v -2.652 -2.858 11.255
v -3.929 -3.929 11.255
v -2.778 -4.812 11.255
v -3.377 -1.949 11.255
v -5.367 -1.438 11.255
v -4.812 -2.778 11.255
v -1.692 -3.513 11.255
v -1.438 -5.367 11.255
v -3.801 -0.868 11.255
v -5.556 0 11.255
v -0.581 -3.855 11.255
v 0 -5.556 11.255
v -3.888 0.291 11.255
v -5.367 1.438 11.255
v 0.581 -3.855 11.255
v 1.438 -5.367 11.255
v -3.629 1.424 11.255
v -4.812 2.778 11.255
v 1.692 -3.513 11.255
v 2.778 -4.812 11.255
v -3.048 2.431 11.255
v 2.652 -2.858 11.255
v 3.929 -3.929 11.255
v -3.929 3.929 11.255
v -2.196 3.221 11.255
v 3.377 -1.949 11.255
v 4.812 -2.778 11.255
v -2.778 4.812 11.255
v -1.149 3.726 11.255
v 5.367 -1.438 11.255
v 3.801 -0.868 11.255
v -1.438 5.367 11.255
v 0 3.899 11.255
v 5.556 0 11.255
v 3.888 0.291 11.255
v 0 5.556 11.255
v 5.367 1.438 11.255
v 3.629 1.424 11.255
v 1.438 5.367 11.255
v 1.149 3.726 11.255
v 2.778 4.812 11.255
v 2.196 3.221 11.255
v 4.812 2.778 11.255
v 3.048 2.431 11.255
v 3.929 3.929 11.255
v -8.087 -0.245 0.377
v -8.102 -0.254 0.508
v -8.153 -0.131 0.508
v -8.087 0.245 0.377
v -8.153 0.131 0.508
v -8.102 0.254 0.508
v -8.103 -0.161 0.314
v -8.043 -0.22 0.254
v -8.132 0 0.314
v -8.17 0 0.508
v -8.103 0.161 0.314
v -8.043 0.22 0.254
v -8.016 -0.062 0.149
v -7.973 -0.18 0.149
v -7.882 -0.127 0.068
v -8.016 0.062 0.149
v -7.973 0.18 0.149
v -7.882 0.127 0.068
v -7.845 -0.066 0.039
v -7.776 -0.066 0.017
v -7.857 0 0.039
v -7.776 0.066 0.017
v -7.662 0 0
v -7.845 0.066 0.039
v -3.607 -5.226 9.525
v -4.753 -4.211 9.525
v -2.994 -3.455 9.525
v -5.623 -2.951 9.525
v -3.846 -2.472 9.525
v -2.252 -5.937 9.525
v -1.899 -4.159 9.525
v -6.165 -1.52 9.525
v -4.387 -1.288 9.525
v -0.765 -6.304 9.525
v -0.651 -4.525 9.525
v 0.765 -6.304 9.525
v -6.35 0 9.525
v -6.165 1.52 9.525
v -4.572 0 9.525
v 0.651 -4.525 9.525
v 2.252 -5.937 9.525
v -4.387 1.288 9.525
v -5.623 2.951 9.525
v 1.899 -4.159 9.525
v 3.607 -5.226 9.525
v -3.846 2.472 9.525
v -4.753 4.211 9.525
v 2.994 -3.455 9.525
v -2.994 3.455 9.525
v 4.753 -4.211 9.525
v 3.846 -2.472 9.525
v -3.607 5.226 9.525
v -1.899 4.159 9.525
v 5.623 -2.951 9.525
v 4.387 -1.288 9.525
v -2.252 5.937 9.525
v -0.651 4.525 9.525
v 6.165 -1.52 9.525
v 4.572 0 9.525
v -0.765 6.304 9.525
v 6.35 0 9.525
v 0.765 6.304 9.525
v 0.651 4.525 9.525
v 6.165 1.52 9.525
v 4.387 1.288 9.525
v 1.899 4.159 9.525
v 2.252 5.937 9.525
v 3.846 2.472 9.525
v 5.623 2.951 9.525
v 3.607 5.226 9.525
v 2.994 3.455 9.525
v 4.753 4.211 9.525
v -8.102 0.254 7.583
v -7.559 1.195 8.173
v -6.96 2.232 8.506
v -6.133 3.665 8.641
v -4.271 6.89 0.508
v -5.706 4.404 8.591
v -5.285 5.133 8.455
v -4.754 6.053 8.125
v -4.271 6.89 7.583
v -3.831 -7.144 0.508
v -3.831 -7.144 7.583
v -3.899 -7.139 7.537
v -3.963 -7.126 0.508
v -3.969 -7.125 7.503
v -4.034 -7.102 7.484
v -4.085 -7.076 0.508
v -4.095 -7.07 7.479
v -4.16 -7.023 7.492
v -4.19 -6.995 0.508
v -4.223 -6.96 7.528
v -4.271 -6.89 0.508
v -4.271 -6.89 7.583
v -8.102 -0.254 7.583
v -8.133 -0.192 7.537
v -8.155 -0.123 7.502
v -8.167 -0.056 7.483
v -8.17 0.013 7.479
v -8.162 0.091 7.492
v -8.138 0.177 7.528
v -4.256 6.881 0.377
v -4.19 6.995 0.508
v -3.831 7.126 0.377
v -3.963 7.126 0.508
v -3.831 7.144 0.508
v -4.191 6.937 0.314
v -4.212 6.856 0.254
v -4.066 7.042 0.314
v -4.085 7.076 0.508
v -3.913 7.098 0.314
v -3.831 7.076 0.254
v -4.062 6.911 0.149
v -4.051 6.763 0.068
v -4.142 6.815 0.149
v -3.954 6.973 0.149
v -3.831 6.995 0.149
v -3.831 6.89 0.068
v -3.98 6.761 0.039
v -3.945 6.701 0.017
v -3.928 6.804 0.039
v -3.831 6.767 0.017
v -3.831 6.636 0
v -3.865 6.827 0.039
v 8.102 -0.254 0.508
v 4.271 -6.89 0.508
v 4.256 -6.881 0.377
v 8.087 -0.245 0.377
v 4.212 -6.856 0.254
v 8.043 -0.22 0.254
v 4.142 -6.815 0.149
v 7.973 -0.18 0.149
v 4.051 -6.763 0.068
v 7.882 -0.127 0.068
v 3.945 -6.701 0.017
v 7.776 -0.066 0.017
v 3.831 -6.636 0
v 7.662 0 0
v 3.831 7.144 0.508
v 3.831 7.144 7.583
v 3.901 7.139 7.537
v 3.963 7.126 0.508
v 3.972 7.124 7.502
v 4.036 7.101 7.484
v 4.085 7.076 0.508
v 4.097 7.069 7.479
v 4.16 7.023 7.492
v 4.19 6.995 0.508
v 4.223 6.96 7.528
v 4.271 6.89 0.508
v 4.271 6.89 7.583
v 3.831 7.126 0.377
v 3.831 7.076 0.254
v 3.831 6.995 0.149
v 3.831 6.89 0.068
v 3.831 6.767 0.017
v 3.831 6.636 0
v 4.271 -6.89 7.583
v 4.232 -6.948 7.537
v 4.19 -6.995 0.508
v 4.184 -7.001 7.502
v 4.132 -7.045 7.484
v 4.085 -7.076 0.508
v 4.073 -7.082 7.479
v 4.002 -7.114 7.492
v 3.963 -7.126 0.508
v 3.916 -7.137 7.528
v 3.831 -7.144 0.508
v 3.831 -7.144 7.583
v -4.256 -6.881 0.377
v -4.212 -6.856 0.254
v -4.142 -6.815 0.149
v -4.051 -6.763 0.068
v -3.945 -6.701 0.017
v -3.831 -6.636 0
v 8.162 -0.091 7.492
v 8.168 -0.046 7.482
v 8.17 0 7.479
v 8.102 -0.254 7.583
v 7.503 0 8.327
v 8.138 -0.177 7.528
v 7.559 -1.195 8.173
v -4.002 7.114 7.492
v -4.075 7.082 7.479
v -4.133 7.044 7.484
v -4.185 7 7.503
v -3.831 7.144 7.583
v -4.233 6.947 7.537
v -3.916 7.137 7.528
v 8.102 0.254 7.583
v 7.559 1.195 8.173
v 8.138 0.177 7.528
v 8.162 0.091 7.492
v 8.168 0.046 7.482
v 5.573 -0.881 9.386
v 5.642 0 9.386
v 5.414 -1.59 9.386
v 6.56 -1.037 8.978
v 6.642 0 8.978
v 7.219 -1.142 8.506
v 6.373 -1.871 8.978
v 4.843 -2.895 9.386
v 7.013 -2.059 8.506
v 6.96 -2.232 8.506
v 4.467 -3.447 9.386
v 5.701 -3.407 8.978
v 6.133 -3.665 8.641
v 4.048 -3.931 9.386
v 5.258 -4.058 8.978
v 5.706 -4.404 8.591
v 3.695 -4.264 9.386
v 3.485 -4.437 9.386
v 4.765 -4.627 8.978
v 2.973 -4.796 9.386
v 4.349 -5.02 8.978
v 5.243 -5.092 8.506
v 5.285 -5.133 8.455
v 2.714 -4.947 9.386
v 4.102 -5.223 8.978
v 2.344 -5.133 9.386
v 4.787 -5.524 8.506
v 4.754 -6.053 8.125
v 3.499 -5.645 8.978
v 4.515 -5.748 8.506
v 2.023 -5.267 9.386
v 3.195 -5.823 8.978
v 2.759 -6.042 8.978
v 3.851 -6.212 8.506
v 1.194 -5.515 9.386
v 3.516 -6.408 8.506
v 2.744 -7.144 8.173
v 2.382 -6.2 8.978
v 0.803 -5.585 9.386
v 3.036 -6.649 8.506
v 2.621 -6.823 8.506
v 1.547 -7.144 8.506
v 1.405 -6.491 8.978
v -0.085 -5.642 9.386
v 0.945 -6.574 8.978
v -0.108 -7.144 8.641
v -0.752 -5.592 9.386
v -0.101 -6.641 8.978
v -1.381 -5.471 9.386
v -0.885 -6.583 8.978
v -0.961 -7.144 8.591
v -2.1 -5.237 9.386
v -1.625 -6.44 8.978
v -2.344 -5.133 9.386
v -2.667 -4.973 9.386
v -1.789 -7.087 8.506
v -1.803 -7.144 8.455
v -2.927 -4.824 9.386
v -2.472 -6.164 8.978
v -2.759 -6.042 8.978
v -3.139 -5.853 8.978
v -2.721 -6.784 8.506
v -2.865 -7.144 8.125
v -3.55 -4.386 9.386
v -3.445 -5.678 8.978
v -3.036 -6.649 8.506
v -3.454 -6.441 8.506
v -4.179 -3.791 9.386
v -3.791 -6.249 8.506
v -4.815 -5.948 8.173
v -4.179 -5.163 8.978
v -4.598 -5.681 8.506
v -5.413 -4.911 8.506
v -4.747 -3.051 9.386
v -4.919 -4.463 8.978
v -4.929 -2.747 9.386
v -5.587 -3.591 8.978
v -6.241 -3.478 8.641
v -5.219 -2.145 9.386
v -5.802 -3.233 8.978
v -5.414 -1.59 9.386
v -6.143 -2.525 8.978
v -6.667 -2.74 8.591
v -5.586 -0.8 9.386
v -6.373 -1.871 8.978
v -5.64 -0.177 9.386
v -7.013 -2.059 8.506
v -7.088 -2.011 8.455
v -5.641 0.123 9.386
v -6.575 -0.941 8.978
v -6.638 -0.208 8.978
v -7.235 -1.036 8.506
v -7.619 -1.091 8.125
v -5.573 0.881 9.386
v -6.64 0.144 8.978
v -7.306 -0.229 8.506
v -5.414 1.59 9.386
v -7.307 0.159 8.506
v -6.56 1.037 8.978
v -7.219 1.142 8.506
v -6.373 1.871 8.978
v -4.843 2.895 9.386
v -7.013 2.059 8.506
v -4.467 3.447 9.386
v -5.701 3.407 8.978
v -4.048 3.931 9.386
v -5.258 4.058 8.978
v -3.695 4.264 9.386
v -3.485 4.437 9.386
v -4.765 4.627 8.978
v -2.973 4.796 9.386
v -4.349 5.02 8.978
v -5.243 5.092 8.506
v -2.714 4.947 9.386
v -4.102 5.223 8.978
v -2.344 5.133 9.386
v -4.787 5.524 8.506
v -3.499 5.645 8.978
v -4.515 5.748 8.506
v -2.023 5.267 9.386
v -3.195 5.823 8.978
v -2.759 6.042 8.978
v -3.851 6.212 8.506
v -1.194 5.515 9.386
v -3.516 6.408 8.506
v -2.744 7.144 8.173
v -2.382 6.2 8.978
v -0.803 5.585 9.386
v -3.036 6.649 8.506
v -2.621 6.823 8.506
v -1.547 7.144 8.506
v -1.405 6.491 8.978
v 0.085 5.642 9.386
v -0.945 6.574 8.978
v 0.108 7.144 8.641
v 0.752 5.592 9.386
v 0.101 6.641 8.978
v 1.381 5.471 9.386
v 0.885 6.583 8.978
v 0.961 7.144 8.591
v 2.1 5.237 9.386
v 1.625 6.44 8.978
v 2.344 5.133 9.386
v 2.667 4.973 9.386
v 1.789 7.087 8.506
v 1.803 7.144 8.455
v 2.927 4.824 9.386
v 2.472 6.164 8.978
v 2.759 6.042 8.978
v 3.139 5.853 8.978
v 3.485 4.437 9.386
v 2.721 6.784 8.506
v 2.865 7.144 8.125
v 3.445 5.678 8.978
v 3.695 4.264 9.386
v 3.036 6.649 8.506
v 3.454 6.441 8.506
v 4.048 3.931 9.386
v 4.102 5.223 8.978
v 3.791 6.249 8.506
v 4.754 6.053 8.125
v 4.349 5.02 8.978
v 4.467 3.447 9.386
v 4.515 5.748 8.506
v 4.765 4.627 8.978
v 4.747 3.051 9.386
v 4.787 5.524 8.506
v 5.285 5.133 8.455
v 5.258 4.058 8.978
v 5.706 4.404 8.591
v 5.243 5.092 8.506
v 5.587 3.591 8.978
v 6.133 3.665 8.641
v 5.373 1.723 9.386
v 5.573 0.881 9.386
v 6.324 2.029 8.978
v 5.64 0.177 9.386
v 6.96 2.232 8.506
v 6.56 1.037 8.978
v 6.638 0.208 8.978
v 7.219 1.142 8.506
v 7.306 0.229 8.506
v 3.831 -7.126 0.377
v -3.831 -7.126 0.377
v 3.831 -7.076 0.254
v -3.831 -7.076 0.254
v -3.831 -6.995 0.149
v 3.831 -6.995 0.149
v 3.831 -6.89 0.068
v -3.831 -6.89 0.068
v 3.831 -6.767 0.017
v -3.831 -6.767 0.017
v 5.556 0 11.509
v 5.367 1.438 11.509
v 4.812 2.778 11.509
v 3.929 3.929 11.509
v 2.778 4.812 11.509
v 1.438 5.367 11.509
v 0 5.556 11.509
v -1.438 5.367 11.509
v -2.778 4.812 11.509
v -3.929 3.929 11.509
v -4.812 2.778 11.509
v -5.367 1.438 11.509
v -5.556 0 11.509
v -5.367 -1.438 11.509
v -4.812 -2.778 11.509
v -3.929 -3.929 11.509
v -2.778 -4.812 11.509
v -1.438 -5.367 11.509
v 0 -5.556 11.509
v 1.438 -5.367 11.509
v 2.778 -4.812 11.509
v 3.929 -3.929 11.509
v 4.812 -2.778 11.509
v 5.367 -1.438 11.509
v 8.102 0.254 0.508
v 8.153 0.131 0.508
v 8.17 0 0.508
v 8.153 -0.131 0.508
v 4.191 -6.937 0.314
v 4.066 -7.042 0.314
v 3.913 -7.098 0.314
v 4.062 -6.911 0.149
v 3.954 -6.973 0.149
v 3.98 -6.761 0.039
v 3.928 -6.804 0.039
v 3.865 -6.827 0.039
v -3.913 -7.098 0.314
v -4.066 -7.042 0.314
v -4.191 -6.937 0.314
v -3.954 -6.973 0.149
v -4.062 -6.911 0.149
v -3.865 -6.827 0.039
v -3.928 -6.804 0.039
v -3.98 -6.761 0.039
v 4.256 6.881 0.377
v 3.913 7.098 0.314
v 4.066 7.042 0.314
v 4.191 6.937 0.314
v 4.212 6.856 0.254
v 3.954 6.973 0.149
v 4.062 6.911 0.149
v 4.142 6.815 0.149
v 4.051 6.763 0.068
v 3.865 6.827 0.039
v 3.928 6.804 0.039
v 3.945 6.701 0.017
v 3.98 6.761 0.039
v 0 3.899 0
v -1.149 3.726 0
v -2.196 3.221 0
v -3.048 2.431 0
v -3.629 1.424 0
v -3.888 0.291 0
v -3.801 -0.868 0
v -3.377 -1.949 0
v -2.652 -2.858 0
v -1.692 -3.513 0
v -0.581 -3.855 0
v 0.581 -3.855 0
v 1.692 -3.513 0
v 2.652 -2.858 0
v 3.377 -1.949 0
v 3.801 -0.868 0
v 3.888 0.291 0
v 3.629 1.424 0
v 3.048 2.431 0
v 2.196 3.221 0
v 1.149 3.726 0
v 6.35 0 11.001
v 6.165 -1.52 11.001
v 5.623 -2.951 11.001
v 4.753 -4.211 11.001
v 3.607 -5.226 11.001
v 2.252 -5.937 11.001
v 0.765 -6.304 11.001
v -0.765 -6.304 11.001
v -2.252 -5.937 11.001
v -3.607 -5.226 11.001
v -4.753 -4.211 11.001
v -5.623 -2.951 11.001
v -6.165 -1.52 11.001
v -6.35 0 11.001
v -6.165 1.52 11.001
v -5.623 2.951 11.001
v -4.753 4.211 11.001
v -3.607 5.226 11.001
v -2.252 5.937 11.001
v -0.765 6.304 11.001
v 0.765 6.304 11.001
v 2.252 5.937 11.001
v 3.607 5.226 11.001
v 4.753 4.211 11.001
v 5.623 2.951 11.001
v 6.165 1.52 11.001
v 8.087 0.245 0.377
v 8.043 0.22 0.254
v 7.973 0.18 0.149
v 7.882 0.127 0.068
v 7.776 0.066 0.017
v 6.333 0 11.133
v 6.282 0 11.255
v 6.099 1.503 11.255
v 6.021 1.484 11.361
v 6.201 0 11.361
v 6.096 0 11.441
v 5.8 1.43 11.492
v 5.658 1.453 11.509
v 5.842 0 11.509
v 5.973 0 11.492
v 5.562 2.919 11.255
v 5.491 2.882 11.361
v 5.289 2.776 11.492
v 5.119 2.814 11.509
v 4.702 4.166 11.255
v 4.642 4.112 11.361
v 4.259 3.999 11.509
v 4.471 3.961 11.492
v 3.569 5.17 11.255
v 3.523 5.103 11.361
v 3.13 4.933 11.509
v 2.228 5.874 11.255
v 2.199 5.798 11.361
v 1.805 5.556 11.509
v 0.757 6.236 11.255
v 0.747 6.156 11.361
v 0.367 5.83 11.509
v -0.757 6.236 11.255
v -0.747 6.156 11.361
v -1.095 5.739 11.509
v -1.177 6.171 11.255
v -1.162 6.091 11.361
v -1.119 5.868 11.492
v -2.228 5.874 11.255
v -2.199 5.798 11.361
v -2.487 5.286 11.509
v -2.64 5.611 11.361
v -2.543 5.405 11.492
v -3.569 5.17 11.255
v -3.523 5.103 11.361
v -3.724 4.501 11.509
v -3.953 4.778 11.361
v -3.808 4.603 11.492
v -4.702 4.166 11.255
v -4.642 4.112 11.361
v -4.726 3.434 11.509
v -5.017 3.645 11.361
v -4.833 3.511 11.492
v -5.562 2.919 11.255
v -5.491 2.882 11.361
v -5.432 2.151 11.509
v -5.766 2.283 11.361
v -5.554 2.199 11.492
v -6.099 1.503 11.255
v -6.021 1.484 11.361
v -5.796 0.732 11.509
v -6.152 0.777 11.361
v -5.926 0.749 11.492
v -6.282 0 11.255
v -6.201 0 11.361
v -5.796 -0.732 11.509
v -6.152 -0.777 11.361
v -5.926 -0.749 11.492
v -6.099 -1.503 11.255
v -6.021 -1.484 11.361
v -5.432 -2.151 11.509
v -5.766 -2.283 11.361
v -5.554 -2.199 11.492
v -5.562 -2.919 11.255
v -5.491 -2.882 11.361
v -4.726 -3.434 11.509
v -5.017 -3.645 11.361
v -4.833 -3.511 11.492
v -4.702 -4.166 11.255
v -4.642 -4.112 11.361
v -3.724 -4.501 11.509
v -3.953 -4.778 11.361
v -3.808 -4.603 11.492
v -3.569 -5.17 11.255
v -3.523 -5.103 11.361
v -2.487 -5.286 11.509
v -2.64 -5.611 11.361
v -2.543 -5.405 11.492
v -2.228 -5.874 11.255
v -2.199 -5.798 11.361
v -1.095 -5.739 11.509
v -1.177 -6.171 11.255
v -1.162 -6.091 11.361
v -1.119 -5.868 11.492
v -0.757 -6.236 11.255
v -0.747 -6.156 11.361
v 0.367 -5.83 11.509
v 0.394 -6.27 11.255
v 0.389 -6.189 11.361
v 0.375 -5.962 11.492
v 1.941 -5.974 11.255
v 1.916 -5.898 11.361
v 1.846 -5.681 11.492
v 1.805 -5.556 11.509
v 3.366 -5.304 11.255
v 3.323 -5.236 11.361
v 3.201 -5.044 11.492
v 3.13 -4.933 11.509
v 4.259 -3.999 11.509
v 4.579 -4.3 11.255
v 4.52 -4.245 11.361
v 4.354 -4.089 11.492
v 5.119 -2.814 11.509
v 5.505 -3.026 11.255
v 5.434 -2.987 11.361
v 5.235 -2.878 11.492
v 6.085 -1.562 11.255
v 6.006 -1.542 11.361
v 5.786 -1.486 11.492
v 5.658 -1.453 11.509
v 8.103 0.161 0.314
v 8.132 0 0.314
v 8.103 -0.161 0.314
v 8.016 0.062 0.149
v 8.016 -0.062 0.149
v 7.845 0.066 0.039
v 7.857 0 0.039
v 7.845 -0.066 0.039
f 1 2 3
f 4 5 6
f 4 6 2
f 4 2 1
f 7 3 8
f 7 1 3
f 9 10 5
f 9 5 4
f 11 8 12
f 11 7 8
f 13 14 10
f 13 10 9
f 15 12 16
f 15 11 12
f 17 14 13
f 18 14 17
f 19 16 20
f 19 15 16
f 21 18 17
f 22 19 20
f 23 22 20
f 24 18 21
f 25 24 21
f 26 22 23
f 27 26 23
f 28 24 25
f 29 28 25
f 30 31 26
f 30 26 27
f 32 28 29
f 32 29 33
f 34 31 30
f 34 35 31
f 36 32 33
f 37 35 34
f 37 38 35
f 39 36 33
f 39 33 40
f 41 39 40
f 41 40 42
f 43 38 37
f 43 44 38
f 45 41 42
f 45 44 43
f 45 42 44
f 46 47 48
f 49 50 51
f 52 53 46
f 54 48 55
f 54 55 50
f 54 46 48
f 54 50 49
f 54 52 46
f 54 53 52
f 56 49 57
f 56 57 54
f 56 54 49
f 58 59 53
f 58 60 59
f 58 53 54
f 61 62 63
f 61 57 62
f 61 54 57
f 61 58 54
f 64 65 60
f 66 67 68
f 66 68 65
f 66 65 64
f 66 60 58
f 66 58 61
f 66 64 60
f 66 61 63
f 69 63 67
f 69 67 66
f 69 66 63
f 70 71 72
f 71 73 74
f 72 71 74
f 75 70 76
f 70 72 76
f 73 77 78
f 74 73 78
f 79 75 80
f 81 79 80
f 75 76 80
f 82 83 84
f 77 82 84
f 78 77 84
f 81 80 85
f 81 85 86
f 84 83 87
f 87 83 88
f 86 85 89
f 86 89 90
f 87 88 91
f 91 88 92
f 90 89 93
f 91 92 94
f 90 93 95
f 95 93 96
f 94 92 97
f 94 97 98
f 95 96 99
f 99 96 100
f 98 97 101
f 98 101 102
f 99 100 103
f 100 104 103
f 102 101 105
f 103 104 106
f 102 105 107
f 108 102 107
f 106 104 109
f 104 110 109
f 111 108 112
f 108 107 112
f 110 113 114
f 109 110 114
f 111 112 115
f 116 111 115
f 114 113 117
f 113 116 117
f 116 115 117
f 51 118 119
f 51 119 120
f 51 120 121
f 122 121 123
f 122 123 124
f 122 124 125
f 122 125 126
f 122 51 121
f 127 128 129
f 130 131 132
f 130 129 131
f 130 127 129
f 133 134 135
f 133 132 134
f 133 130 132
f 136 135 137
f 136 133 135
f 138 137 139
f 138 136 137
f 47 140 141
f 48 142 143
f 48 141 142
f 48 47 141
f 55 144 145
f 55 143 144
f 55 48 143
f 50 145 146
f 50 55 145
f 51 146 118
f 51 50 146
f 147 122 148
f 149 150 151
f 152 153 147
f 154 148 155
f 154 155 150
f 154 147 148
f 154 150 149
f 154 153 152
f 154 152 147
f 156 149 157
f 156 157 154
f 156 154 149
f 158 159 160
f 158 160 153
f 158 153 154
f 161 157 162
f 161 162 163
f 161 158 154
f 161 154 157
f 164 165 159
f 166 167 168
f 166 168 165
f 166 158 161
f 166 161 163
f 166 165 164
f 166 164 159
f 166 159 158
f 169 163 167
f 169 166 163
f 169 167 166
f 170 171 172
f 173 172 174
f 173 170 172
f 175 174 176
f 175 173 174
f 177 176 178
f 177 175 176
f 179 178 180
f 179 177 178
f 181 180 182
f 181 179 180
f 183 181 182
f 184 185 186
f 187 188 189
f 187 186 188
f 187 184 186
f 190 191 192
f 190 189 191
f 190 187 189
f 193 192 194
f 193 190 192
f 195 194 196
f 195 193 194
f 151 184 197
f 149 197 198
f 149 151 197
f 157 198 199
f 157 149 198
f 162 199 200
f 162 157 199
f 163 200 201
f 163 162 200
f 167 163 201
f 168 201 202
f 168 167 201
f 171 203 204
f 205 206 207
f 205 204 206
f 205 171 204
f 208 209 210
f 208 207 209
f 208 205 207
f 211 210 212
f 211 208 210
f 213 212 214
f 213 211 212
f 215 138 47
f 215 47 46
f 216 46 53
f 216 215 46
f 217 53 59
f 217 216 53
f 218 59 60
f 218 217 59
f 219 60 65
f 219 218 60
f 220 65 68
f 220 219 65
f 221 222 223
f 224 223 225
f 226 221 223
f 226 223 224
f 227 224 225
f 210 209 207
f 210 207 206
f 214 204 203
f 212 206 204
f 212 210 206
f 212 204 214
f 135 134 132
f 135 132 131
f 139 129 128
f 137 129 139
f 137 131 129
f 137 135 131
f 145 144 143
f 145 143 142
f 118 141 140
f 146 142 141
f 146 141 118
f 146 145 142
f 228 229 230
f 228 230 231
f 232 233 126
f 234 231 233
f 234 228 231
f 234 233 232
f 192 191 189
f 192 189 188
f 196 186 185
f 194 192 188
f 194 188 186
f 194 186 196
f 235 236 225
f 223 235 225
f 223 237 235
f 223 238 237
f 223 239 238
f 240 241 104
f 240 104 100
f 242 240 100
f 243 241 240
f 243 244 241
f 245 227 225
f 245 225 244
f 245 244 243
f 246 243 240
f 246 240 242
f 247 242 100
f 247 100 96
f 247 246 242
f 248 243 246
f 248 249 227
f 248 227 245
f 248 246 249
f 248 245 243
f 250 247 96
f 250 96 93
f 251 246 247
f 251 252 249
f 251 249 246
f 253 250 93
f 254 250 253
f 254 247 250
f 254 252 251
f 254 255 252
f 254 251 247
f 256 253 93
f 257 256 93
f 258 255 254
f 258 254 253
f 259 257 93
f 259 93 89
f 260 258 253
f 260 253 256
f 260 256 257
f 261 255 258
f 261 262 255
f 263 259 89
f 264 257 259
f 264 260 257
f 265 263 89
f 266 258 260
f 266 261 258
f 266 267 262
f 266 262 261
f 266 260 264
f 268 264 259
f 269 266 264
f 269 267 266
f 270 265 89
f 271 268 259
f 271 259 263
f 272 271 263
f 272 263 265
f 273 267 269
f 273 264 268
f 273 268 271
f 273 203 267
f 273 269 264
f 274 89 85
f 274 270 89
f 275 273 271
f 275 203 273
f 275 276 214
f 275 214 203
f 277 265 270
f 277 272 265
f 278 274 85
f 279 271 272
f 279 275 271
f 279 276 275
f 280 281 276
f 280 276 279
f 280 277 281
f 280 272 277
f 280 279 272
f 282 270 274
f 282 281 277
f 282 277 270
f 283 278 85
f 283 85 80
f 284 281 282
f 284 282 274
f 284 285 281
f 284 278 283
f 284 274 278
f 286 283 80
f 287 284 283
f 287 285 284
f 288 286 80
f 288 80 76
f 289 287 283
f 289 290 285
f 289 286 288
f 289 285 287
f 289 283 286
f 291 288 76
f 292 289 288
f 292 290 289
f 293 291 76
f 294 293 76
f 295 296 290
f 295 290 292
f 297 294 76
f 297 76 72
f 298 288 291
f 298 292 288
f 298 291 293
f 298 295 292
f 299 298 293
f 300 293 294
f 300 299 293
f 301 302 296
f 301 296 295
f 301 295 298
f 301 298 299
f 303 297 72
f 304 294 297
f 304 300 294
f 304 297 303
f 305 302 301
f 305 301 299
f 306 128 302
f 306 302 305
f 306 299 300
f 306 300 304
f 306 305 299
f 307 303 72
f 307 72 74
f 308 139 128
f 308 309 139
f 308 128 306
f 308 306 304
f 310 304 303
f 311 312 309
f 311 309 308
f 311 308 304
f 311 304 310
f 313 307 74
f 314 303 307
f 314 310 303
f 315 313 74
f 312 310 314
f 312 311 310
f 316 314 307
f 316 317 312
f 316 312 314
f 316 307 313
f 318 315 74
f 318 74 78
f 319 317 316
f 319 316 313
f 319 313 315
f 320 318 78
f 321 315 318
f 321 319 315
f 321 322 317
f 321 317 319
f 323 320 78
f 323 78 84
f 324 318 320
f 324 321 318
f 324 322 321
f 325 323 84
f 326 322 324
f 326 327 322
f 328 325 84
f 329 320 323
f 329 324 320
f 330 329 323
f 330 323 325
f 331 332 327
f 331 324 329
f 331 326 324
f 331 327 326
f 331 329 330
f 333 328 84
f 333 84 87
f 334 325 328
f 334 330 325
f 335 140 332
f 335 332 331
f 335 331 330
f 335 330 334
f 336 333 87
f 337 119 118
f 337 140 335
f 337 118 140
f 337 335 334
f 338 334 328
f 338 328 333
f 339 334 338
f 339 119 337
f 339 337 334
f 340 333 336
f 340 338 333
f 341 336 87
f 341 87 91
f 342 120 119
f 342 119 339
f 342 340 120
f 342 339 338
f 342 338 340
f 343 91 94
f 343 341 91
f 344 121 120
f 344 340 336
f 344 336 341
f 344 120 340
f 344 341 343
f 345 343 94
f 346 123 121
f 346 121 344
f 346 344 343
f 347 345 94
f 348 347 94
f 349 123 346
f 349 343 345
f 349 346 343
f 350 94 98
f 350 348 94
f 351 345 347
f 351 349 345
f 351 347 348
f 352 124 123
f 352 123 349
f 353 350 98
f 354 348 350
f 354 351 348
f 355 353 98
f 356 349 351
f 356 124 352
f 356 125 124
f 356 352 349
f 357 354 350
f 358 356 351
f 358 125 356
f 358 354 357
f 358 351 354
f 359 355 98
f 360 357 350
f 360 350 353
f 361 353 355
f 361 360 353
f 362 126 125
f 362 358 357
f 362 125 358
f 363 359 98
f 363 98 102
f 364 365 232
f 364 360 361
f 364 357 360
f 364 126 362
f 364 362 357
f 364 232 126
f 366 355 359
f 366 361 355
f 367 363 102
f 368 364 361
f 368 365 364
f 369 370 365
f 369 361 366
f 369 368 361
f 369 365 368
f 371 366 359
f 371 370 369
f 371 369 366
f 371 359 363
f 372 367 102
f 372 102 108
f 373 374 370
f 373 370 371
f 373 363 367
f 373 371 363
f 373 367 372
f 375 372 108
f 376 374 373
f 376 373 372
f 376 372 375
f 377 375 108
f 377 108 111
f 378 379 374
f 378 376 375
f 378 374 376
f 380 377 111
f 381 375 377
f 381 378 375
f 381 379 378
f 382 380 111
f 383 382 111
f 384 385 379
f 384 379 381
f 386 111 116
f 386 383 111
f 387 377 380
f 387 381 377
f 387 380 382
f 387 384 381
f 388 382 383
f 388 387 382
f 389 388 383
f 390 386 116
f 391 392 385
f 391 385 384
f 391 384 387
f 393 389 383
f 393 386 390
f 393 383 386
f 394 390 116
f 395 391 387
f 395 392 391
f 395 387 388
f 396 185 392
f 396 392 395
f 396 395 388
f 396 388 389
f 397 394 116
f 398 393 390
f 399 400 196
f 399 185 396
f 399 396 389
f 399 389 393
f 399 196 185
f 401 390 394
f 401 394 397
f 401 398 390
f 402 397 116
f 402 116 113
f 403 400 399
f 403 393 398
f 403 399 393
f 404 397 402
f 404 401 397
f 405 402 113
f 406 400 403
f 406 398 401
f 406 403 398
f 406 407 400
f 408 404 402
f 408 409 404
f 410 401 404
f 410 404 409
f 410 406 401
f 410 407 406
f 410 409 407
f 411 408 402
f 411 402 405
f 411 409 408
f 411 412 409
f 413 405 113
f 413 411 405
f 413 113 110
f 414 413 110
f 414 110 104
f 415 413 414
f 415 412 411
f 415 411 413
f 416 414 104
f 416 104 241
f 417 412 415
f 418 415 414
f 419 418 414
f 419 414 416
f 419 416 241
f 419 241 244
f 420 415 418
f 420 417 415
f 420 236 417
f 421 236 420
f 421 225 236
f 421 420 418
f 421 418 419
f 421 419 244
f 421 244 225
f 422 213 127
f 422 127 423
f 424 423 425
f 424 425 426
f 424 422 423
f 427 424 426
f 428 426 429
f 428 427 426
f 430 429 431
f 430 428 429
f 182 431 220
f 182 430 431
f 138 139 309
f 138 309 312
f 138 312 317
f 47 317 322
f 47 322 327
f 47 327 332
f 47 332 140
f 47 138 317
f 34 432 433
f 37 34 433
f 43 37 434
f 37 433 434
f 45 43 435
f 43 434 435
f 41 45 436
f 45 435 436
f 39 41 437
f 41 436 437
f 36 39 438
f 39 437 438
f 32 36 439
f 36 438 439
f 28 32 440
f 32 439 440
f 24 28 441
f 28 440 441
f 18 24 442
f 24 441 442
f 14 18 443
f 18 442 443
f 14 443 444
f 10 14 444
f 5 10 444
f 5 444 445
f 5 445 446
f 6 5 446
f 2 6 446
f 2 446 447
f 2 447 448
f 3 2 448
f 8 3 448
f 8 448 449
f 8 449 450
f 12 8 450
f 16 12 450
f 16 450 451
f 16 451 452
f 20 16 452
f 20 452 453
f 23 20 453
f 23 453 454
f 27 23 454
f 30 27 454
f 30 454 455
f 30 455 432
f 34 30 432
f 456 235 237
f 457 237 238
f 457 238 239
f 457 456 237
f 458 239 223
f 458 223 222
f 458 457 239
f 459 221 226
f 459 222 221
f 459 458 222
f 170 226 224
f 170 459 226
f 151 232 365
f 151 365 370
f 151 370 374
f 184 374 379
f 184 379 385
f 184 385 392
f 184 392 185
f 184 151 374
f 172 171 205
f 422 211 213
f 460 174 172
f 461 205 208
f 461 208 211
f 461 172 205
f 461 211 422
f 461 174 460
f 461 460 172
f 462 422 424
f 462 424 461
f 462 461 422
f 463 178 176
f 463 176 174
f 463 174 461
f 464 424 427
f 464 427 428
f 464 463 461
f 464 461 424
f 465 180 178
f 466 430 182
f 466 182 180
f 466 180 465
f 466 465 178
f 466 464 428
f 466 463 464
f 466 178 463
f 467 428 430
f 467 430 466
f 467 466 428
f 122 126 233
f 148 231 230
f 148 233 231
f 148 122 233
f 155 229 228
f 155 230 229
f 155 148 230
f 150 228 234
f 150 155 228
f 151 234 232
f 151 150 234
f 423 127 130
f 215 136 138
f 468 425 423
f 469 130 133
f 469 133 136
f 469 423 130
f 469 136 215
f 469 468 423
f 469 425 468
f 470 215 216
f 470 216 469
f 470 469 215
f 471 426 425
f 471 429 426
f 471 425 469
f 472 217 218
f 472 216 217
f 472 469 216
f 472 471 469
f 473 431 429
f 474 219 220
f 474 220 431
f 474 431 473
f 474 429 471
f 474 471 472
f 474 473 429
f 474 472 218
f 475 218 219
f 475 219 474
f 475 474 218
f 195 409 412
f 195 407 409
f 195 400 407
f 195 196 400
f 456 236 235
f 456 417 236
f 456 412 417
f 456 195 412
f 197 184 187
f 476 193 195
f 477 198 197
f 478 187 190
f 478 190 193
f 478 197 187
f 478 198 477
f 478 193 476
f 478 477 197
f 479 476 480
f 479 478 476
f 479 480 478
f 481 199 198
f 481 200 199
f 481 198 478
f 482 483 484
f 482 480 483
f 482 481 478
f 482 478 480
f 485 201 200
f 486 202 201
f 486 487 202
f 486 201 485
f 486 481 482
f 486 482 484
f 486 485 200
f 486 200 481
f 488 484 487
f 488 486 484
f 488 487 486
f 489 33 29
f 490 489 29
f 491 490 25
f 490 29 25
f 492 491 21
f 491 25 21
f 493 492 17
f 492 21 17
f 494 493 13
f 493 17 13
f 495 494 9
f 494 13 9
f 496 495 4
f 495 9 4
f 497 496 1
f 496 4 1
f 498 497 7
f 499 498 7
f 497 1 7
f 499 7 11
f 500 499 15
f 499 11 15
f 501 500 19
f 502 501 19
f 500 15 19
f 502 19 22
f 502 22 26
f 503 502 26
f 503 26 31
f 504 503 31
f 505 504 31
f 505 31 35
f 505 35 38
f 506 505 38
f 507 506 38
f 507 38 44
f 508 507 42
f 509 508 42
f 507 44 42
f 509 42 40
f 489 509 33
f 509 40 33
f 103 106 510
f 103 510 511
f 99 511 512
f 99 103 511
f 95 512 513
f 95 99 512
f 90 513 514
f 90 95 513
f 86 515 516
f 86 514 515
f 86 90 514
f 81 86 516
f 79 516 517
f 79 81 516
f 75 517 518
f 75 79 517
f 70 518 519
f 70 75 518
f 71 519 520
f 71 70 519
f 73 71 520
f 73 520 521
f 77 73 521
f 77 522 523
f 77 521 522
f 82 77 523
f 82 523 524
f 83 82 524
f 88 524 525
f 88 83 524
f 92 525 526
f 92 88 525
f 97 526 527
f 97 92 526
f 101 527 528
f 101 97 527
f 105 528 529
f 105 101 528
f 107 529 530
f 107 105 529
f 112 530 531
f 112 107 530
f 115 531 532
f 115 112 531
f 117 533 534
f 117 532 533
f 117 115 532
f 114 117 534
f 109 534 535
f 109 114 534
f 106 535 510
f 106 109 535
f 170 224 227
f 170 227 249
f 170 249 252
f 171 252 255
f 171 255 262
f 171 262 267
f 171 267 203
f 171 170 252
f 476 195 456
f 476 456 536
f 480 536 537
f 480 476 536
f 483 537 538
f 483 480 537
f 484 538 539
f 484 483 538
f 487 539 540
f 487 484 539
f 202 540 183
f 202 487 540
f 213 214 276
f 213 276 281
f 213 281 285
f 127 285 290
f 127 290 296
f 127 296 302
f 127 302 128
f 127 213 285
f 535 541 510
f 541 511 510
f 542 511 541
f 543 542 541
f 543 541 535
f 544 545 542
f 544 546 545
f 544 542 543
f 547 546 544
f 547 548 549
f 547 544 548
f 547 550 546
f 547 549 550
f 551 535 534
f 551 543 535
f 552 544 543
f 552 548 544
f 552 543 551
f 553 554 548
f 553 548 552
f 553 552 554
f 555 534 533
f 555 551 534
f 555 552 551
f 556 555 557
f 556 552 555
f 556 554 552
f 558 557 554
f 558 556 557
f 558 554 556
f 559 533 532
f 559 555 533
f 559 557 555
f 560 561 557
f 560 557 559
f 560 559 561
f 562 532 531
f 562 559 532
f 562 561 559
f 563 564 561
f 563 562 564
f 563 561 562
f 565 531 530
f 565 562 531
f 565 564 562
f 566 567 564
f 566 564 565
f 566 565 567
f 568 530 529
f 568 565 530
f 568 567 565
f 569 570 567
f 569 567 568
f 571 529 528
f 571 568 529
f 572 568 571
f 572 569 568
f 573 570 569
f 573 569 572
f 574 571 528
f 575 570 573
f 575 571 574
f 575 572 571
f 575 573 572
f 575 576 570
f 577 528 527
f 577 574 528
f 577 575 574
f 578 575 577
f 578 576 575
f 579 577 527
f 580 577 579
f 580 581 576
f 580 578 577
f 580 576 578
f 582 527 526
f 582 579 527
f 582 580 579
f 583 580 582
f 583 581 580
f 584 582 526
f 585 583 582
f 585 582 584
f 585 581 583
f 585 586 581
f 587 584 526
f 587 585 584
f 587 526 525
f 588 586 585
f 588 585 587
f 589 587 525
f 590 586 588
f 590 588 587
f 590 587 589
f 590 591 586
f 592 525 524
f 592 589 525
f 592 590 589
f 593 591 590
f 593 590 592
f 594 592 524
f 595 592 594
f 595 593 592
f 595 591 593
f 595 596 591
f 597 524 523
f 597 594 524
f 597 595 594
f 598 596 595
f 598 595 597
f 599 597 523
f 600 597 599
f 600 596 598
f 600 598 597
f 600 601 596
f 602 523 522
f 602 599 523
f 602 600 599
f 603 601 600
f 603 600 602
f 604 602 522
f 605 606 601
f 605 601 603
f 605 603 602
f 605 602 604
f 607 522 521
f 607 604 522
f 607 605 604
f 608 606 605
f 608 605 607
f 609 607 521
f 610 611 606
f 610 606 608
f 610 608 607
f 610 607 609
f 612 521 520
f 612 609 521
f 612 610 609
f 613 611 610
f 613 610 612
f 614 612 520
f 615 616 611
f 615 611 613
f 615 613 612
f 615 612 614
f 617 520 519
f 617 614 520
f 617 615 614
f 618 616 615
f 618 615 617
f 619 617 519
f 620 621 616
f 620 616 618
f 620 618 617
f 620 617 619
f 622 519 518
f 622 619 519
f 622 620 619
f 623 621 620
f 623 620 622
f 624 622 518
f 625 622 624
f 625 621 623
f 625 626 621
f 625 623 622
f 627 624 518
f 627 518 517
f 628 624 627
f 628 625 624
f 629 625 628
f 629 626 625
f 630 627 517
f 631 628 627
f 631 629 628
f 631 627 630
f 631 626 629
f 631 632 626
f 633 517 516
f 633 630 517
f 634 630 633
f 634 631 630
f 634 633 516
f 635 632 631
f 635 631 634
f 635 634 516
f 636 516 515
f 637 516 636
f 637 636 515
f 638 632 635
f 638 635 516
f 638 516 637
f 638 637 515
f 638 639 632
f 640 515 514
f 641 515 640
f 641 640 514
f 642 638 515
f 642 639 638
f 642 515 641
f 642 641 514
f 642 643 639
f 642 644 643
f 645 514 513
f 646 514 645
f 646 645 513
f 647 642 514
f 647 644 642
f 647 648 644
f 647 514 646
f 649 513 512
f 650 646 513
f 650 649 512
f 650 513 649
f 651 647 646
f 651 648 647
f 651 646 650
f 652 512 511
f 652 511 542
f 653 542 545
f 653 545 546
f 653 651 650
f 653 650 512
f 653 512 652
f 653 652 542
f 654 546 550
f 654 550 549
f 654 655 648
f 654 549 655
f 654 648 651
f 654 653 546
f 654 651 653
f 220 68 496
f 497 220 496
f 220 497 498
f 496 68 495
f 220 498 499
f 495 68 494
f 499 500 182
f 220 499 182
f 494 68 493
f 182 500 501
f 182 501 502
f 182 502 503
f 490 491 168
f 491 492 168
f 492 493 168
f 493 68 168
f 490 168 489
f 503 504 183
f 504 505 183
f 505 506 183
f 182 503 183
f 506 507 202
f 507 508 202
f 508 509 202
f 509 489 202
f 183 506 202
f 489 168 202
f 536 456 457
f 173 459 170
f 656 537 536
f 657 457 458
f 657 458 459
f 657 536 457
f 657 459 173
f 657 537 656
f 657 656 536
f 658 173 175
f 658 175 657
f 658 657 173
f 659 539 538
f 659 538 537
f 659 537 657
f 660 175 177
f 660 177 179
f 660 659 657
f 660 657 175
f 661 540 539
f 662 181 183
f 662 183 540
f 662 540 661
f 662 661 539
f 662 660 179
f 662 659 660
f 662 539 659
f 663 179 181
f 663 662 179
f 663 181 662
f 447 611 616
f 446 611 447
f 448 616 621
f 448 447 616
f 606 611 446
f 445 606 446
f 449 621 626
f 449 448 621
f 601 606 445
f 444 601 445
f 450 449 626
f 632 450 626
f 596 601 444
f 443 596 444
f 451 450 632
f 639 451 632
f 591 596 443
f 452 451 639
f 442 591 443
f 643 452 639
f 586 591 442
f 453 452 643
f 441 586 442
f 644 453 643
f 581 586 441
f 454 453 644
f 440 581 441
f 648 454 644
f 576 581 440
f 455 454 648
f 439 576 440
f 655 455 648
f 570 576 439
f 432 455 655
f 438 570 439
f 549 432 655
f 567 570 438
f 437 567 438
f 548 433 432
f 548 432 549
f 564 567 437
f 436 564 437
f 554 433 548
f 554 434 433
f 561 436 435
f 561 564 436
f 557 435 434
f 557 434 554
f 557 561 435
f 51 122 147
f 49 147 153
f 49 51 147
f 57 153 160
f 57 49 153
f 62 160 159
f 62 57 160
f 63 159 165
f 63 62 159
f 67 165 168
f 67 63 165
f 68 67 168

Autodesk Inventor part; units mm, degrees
ref_plane "YZ Plane" through (0, 0, 0) normal (1, 0, 0) x (0, 1, 0)
ref_plane "XZ Plane" through (0, 0, 0) normal (0, 1, 0) x (-1, 0, 0)
ref_plane "XY Plane" through (0, 0, 0) normal (0, 0, 1) x (1, 0, 0)
sketch "Sketch1" plane through (0, 0, 0) normal (0, 0, 1) x (1, 0, 0)
  line L0 (-4.1244, 7.1437) -> (4.1244, 7.1437)
  line L1 (4.1244, 7.1437) -> (8.2489, 0)
  line L2 (8.2489, 0) -> (4.1244, -7.1437)
  line L3 (4.1244, -7.1437) -> (-4.1244, -7.1437)
  line L4 (-4.1244, -7.1437) -> (-8.2489, 0)
  line L5 (-8.2489, 0) -> (-4.1244, 7.1437)
  point P0 (0, 0)
  point P1 (0, 0)
  dimension "d0" = 14.2875
extrude "Extrusion1" add sketch "Sketch1" along normal blind 9.525
sketch "Sketch3" plane through (0, 0, 9.525) normal (0, 0, 1) x (1, 0, 0)
  circle A0 centre (0, 0) radius 6.35
  dimension "d3" = 12.7
extrude "Extrusion2" add sketch "Sketch3" along normal blind 1.9844
sketch "Sketch8" plane through (0, 0, 11.5094) normal (0, 0, 1) x (1, 0, 0)
  circle A0 centre (0, 0) radius 6.35 projected
  circle A1 centre (0, 0) radius 5.5563
  circle A2 centre (0, 0) radius 5.1594
  dimension "d14" = 11.1125
  dimension "d28" = 10.3187
extrude "Extrusion3" cut sketch "Sketch8" against normal blind 0.254 contours A1 | A2
sketch "Sketch9" plane through (0, 0, 0) normal (0, 0, -1) x (-1, 0, 0)
  point P0 (0, 0)
hole "Hole2" at (0, 0, 0) direction (0, 0, 1) diameter 7.7978 end through all thread size "3/8-16 UNC" class "2B" standard "ANSI Unified Screw Threads"
sketch "Sketch10" plane through (0, 0, 0) normal (0, 1, 0) x (-1, 0, 0)
  line L0 (-8.2489, 9.525) -> (-4.1244, 9.525) projected
  line L1 (-4.1244, 0) -> (-4.1244, 9.525) projected
  line L2 (-8.2489, 0) -> (-4.1244, 0) projected
  line L3 (-8.2489, 0) -> (-8.2489, 9.525) projected
  line L4 (0, 0) -> (0, 6.9243)
  arc A0 (-4.572, 9.525) -> (-8.2489, 7.3406) centre (-4.572, 5.3382) ccw
  line L5 (-8.2489, 7.3406) -> (-8.2489, 9.525)
  line L6 (-4.572, 9.525) -> (-8.2489, 9.525)
  dimension "d24" = 4.572
revolve "Revolution2" cut sketch "Sketch10" angle 360 about axis through (0, 0, 0) along (0, 0, 1) contours L0 A0 L3
fillet "Fillet1" radius 0.508 12 edges at (-4.1244, -7.1437, 3.6703) (4.1244, -7.1437, 3.6703) (8.2489, 0, 3.6703) (4.1244, 7.1437, 3.6703) (-8.2489, 0, 3.6703) (-4.1244, 7.1437, 3.6703) (0, 7.1437, 0) (6.1867, 3.5719, 0) (6.1867, -3.5719, 0) (0, -7.1437, 0) (-6.1867, -3.5719, 0) (-6.1867, 3.5719, 0)
fillet "Fillet2" radius 0.508 1 edges at (-6.35, 0, 11.5094)
properties part number "10-32 regular lock nut" material "Steel"
